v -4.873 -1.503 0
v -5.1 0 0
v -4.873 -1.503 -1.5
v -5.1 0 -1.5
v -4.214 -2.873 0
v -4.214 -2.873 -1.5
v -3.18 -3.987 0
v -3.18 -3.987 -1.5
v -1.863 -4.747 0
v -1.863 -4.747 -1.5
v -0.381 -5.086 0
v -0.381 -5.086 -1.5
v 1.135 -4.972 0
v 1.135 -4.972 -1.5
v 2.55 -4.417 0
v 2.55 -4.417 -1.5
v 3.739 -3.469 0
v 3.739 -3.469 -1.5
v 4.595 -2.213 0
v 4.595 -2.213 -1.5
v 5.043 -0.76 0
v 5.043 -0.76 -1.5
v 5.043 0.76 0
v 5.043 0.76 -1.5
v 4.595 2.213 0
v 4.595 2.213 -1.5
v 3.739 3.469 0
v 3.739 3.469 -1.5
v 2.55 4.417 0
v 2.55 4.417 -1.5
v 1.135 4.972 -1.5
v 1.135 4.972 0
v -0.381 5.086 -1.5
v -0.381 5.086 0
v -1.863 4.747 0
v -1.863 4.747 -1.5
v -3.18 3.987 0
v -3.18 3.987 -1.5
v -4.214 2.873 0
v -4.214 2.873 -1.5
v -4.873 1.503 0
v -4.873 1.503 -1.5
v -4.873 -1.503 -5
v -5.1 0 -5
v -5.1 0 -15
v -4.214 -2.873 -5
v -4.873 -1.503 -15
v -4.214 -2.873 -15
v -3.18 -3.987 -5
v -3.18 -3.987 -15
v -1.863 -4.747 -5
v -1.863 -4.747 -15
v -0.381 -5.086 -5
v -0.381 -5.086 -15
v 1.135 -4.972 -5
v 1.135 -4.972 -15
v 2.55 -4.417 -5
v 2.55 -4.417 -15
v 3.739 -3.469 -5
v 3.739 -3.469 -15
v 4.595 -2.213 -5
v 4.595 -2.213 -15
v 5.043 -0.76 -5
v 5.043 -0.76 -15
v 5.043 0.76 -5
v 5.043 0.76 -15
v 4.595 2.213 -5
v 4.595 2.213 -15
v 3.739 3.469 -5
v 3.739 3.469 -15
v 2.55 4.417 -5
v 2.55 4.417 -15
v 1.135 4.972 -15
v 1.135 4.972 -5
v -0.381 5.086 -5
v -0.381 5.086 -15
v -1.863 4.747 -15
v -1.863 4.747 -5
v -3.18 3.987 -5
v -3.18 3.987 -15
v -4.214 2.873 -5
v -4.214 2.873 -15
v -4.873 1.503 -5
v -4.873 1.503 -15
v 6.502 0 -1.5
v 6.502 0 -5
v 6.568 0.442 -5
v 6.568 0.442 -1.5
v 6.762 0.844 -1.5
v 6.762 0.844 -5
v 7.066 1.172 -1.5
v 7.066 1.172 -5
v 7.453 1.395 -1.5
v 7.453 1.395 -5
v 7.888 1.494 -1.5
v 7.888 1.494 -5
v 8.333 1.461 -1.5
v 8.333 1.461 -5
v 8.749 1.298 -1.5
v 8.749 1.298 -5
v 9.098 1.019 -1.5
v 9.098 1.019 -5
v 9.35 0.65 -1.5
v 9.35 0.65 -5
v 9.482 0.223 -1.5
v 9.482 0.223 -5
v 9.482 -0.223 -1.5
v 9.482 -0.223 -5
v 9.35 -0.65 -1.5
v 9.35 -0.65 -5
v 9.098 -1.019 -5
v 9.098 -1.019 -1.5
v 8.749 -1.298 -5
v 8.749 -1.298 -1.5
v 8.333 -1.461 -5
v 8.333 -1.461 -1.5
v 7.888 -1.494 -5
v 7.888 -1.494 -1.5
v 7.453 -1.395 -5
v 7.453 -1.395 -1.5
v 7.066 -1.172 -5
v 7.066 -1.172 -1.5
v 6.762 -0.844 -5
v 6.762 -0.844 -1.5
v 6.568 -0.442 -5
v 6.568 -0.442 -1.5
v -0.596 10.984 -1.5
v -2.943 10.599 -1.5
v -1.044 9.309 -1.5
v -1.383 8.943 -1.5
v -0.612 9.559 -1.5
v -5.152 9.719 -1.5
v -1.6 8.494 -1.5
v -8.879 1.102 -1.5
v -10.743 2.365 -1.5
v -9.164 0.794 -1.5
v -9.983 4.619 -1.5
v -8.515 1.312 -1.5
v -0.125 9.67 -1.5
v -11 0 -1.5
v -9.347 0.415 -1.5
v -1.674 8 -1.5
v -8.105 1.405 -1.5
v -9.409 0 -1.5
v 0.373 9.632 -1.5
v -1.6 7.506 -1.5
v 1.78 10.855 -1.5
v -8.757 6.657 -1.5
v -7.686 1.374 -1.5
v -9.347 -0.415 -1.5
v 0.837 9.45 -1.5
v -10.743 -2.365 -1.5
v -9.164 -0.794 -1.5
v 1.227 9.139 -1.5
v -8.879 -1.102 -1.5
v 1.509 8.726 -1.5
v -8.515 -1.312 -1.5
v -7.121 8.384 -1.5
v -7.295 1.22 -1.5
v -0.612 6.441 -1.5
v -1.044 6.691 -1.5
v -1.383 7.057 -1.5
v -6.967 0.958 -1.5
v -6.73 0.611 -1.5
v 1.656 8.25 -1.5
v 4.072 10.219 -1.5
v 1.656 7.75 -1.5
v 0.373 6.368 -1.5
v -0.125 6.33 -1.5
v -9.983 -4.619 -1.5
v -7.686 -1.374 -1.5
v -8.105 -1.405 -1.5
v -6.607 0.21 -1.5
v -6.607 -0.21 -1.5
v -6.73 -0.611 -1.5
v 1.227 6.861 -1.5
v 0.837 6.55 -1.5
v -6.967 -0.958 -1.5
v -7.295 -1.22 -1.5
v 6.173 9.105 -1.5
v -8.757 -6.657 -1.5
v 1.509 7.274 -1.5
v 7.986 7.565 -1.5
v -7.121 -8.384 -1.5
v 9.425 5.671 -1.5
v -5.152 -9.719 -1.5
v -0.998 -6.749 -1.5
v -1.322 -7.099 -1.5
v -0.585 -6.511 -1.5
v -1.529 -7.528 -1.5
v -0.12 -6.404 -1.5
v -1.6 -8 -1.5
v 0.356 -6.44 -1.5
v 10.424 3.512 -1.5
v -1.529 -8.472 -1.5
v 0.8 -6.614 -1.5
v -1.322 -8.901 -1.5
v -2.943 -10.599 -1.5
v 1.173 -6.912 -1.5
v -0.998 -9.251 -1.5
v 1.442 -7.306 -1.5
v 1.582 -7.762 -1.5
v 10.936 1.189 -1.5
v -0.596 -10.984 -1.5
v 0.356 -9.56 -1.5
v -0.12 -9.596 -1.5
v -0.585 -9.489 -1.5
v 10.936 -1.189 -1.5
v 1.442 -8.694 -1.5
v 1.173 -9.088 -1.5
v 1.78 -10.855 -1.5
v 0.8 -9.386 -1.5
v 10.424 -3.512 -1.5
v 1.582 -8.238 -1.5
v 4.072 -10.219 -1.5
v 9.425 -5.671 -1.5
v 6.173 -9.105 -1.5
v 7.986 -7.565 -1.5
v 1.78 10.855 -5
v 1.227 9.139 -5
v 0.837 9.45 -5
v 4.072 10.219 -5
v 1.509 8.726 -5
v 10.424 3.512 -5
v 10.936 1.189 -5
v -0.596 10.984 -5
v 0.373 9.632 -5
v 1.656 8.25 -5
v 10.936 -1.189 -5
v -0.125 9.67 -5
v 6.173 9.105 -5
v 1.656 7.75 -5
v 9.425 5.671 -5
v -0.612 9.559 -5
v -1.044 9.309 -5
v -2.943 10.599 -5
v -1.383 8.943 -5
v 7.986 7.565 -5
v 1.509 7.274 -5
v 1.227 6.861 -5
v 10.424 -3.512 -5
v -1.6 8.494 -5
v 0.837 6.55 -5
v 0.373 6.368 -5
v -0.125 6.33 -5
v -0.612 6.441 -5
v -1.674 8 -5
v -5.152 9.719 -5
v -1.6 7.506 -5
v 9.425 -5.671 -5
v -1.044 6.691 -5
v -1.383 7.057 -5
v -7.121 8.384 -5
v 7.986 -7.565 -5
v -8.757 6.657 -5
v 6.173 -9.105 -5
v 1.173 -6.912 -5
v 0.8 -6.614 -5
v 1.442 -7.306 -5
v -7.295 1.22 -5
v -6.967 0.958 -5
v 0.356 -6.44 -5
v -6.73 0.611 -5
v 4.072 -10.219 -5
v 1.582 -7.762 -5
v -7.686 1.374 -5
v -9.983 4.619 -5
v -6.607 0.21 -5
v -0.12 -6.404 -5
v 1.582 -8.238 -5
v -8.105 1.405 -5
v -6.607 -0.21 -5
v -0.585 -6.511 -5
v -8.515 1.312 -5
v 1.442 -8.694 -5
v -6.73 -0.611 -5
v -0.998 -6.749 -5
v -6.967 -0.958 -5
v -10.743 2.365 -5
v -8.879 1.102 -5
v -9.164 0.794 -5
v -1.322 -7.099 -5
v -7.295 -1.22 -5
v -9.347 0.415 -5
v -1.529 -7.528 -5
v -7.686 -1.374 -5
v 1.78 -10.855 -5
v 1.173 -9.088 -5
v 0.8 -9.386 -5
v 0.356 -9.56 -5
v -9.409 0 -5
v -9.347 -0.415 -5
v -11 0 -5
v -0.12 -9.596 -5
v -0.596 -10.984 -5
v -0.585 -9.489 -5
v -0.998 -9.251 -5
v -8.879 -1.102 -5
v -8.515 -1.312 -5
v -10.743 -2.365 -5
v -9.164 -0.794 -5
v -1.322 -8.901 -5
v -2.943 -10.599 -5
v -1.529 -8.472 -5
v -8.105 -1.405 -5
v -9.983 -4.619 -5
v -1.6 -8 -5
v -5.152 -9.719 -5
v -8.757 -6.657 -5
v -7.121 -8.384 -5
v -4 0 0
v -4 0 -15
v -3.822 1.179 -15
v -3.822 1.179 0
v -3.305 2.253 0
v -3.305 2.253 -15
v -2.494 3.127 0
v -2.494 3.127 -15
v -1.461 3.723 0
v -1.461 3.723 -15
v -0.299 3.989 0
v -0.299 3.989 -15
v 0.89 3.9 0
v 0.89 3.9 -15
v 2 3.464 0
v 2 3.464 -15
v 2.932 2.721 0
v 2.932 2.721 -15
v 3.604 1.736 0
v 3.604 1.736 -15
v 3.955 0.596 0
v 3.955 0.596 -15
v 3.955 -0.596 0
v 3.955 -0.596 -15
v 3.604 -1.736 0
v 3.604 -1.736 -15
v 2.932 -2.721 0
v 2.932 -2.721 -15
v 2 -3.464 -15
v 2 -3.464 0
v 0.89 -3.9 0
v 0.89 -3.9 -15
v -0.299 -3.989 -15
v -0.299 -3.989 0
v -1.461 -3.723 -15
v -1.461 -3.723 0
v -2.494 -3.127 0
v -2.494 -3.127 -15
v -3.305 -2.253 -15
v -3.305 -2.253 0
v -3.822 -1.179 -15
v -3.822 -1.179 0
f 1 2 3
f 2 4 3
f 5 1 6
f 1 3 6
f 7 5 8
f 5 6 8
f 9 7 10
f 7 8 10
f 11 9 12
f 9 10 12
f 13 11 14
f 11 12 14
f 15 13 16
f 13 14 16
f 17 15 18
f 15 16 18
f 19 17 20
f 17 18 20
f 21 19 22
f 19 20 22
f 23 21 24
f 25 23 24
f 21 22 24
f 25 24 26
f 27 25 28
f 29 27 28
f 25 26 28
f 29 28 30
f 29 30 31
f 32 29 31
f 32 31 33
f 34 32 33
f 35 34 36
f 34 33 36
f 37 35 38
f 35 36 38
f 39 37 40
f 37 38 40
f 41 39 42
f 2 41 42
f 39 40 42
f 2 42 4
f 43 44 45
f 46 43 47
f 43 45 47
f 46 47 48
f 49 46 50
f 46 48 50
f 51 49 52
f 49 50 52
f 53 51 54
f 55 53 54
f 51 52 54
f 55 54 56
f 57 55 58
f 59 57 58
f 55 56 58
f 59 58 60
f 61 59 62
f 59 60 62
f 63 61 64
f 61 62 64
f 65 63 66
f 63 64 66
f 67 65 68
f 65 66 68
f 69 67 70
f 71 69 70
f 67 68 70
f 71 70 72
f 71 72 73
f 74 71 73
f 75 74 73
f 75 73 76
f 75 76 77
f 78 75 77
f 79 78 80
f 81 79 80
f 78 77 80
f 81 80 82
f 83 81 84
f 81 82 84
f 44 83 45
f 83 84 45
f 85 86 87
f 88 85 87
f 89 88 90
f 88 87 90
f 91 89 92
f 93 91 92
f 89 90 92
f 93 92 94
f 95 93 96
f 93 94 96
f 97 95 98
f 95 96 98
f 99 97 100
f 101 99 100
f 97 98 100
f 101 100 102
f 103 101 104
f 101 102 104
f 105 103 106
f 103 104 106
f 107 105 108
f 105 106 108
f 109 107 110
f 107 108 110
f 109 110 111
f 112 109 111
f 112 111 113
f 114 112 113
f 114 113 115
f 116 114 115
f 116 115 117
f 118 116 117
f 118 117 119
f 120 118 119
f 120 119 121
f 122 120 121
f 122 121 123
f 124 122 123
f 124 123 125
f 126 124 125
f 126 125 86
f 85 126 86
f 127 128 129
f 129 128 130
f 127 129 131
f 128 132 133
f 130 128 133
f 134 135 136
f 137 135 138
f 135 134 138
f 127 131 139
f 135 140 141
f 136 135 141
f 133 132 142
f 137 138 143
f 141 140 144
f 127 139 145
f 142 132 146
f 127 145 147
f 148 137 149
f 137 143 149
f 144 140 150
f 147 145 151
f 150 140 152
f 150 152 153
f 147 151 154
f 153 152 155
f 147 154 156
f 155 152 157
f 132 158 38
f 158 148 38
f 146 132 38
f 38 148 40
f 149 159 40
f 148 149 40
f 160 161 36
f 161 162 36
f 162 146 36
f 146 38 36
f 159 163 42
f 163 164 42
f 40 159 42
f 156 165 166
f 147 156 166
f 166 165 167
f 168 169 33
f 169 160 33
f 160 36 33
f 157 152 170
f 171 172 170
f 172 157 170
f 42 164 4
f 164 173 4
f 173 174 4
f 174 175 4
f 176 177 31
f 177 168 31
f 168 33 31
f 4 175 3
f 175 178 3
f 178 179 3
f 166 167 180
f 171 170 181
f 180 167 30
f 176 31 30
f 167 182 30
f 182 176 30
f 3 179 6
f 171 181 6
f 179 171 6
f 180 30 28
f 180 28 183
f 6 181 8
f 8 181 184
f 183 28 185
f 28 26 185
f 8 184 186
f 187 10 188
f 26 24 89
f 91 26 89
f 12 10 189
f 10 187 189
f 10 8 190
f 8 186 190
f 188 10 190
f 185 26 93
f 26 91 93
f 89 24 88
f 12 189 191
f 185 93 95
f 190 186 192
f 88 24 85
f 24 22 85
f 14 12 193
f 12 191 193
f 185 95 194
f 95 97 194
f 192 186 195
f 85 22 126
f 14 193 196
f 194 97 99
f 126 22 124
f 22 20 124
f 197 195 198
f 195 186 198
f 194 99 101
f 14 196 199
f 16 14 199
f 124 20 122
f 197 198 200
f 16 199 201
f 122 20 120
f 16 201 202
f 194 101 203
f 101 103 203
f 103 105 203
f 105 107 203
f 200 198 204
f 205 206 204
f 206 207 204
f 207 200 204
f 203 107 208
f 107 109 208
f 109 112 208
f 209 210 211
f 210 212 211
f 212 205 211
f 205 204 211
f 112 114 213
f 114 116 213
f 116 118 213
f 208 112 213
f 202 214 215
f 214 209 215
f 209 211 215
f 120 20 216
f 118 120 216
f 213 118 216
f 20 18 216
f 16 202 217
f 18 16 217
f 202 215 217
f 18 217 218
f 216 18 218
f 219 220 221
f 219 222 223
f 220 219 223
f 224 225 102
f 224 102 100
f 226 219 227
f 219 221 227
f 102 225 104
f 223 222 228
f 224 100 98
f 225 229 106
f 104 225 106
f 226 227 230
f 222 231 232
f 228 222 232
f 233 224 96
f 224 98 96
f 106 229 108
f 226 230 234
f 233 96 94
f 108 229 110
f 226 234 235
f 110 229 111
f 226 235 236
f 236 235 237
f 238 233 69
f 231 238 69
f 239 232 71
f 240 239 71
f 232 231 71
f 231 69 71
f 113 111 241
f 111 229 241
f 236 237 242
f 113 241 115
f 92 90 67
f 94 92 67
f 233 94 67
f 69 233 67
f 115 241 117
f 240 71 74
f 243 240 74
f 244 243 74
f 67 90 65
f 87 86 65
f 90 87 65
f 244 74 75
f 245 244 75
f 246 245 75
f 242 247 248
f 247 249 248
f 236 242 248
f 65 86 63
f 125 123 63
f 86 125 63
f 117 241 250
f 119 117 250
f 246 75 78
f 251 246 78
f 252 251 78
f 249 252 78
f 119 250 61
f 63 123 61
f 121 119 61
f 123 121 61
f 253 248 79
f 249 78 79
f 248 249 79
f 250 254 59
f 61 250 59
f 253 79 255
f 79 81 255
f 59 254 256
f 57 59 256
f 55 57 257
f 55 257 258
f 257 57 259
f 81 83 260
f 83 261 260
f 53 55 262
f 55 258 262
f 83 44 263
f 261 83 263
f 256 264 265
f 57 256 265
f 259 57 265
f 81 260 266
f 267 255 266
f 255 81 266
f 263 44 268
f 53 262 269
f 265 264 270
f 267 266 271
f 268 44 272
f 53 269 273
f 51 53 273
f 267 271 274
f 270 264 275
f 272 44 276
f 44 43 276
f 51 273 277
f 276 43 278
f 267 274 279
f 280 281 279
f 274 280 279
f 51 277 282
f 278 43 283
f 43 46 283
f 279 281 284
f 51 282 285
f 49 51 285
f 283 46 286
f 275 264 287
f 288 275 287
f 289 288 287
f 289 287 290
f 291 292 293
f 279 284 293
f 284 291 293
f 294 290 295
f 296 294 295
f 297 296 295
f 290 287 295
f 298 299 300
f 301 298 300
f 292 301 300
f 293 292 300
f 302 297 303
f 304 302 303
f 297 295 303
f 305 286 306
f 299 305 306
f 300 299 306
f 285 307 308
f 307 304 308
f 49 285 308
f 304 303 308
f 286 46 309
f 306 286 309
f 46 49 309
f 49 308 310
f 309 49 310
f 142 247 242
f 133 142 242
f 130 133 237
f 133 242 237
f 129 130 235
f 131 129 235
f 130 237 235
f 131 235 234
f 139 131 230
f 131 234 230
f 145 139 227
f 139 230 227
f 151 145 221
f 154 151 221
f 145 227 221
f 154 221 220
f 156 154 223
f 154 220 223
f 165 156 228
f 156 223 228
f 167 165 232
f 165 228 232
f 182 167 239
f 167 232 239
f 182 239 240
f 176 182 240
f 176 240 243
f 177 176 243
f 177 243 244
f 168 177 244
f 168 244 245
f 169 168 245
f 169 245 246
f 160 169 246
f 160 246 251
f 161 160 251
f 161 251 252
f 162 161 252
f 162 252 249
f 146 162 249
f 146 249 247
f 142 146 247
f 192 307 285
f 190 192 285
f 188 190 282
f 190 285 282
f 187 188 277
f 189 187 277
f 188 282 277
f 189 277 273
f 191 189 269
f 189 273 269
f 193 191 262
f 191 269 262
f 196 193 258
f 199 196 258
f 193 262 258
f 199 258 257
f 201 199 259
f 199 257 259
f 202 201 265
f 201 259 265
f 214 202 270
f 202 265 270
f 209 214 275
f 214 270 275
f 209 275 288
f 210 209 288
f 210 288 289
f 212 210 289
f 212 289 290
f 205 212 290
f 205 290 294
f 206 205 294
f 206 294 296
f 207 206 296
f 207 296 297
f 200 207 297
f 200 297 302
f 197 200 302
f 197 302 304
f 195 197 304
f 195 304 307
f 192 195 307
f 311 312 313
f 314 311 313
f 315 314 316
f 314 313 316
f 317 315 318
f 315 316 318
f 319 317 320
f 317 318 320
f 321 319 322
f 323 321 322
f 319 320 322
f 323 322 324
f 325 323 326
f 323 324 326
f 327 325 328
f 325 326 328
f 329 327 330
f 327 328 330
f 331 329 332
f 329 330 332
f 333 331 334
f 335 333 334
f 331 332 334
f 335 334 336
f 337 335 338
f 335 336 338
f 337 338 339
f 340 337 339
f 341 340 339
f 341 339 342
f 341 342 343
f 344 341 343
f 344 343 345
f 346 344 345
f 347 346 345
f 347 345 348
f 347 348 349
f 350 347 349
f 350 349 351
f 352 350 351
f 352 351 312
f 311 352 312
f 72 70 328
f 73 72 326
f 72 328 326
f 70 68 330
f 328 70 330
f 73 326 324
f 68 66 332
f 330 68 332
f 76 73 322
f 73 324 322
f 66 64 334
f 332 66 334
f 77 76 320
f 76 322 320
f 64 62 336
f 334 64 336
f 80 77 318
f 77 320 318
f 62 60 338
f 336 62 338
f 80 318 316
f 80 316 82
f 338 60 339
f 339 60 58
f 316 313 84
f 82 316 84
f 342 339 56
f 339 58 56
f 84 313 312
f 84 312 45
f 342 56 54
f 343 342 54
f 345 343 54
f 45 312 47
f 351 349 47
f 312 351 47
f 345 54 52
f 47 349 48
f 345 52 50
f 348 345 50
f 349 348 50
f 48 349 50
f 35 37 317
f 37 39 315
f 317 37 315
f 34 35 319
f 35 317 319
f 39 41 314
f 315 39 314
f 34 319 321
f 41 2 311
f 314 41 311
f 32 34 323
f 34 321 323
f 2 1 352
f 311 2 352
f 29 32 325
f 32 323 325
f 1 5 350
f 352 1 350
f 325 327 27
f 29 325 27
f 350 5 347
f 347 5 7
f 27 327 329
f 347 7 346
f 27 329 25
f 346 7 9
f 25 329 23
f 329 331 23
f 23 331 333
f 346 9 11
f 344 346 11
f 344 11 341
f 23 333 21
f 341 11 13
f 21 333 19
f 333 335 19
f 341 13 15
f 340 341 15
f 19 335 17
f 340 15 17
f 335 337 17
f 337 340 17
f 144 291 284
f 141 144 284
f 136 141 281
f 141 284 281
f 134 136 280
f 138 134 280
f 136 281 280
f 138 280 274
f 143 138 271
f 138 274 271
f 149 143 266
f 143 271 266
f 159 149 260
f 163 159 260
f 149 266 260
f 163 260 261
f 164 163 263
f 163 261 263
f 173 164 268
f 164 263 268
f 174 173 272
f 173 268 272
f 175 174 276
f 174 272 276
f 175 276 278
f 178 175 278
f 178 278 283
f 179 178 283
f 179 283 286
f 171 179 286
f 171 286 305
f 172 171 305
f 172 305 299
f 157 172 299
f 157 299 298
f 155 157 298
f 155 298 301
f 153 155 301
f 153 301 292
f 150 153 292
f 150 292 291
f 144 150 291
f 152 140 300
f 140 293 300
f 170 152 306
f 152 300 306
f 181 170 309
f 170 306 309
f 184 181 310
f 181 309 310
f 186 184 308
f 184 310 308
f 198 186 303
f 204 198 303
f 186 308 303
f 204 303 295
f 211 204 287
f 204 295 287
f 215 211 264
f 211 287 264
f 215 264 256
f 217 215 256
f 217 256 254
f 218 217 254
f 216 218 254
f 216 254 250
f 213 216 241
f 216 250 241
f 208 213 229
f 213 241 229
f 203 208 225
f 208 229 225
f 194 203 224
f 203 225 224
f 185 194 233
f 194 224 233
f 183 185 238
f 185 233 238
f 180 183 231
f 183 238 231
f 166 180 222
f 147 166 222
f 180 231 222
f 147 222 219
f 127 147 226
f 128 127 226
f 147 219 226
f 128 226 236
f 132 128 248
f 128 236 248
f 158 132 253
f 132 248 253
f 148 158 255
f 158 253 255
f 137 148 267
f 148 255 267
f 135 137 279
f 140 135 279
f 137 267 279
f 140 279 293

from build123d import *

# Parameters (mm, degrees)
SKETCH2_R          = 4
CUT_EXTRUDE1_DEPTH = 22.610182785
SKETCH3_R          = 1.409137036
SKETCH3_R_2        = 1.6
SKETCH3_R_3        = 1.49849824
SKETCH3_R_4        = 1.674312885
CUT_EXTRUDE2_DEPTH = 19.493242009


with BuildPart() as part:
    # Sketch1 → Revolve1 (revolve)
    with BuildSketch(Plane(origin=(0, 0, 0), x_dir=(1, 0, 0), z_dir=(0, 1, 0)), mode=Mode.PRIVATE) as revolve1_sk:
        Polygon((0, 0), (5.1, 0), (5.1, 1.5), (11, 1.5), (11, 5), (5.1, 5), (5.1, 15), (0, 15), align=None)
    revolve(revolve1_sk.sketch.rotate(Axis((0, 0, -15), (0, 0, 1)), 180), axis=Axis((0, 0, -15), (0, 0, 1)))

    # Sketch2 → Cut-Extrude1 (cut, through all)
    with BuildSketch(Plane(origin=(0, 0, -15), x_dir=(-1, 0, 0), z_dir=(0, 0, -1))):
        Circle(SKETCH2_R)
    extrude(amount=-CUT_EXTRUDE1_DEPTH, mode=Mode.SUBTRACT)

    # Sketch3 → Cut-Extrude2 (cut, through all)
    with BuildSketch(Plane(origin=(0, 0, -5), x_dir=(-1, 0, 0), z_dir=(0, 0, -1))):
        with Locations((8, 0)):
            Circle(SKETCH3_R)
        with Locations((0, -8)):
            Circle(SKETCH3_R_2)
        with Locations((-8, 0)):
            Circle(SKETCH3_R_3)
        with Locations((0, 8)):
            Circle(SKETCH3_R_4)
    extrude(amount=-CUT_EXTRUDE2_DEPTH, mode=Mode.SUBTRACT)


solid = part.part
